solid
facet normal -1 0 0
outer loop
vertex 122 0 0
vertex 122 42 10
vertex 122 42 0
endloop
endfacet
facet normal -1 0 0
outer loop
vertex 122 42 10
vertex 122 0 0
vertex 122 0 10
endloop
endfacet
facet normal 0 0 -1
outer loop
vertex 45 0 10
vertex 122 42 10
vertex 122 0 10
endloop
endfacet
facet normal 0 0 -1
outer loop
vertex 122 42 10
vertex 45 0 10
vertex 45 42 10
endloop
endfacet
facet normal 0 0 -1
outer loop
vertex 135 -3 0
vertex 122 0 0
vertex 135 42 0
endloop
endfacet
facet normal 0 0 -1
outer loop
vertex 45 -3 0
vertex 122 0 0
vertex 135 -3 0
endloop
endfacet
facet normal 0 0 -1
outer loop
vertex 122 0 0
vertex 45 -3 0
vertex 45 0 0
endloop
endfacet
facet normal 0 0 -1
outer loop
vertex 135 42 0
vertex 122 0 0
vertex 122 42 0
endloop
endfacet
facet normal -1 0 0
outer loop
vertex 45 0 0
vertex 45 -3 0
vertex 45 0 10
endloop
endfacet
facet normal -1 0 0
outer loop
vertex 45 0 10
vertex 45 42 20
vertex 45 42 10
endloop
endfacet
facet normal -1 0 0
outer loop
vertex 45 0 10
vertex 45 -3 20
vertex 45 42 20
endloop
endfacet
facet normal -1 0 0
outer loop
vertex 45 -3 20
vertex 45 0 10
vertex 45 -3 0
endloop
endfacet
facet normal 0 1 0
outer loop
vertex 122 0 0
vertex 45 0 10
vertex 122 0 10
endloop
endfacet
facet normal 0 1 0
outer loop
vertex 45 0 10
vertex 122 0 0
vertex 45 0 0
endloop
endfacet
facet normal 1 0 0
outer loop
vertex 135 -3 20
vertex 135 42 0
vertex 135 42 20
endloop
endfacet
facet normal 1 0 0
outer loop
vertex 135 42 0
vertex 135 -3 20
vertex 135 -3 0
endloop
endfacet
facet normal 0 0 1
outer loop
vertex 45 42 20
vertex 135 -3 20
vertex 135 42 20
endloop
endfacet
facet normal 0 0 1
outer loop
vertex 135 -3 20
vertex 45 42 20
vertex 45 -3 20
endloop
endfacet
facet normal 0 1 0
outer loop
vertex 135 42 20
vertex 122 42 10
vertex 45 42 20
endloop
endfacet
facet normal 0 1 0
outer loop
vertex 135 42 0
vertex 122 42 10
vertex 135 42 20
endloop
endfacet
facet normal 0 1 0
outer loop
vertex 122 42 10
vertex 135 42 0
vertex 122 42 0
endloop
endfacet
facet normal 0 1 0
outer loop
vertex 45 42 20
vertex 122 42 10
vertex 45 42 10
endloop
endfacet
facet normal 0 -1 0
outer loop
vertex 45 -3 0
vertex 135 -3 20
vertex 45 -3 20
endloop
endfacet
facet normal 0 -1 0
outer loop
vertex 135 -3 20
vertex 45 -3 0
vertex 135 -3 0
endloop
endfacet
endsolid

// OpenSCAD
// Drying rack for microscope slides - a solid block with a row of parallel slots open at the
// top, so slides standing on their long edge drop in and are supported below. NOVEL general part.
//

slides   = 10;
slide_l  = 75;
slide_w  = 25;
slide_t  = 1;
base_l   = 90;
base_w   = 45;
base_h   = 20;
slot_l   = 77;
slot_w   = 1.6;
slot_d   = 10;
slot_gap = 3.5;

$fn = 48;

slot_s = slot_w + slot_gap;          // step in Y between neighbouring slots
total_w = slides * slot_s;
center_y = base_w / 2 - total_w / 2;

difference() {
    translate([base_l / 2, center_y, 0]) cube([base_l, base_w, base_h]);
    for (i = [0 : slides - 1])
        translate([base_l / 2, i * slot_s, 0])
            cube([slot_l, slot_s, base_h - slot_d]);
}
